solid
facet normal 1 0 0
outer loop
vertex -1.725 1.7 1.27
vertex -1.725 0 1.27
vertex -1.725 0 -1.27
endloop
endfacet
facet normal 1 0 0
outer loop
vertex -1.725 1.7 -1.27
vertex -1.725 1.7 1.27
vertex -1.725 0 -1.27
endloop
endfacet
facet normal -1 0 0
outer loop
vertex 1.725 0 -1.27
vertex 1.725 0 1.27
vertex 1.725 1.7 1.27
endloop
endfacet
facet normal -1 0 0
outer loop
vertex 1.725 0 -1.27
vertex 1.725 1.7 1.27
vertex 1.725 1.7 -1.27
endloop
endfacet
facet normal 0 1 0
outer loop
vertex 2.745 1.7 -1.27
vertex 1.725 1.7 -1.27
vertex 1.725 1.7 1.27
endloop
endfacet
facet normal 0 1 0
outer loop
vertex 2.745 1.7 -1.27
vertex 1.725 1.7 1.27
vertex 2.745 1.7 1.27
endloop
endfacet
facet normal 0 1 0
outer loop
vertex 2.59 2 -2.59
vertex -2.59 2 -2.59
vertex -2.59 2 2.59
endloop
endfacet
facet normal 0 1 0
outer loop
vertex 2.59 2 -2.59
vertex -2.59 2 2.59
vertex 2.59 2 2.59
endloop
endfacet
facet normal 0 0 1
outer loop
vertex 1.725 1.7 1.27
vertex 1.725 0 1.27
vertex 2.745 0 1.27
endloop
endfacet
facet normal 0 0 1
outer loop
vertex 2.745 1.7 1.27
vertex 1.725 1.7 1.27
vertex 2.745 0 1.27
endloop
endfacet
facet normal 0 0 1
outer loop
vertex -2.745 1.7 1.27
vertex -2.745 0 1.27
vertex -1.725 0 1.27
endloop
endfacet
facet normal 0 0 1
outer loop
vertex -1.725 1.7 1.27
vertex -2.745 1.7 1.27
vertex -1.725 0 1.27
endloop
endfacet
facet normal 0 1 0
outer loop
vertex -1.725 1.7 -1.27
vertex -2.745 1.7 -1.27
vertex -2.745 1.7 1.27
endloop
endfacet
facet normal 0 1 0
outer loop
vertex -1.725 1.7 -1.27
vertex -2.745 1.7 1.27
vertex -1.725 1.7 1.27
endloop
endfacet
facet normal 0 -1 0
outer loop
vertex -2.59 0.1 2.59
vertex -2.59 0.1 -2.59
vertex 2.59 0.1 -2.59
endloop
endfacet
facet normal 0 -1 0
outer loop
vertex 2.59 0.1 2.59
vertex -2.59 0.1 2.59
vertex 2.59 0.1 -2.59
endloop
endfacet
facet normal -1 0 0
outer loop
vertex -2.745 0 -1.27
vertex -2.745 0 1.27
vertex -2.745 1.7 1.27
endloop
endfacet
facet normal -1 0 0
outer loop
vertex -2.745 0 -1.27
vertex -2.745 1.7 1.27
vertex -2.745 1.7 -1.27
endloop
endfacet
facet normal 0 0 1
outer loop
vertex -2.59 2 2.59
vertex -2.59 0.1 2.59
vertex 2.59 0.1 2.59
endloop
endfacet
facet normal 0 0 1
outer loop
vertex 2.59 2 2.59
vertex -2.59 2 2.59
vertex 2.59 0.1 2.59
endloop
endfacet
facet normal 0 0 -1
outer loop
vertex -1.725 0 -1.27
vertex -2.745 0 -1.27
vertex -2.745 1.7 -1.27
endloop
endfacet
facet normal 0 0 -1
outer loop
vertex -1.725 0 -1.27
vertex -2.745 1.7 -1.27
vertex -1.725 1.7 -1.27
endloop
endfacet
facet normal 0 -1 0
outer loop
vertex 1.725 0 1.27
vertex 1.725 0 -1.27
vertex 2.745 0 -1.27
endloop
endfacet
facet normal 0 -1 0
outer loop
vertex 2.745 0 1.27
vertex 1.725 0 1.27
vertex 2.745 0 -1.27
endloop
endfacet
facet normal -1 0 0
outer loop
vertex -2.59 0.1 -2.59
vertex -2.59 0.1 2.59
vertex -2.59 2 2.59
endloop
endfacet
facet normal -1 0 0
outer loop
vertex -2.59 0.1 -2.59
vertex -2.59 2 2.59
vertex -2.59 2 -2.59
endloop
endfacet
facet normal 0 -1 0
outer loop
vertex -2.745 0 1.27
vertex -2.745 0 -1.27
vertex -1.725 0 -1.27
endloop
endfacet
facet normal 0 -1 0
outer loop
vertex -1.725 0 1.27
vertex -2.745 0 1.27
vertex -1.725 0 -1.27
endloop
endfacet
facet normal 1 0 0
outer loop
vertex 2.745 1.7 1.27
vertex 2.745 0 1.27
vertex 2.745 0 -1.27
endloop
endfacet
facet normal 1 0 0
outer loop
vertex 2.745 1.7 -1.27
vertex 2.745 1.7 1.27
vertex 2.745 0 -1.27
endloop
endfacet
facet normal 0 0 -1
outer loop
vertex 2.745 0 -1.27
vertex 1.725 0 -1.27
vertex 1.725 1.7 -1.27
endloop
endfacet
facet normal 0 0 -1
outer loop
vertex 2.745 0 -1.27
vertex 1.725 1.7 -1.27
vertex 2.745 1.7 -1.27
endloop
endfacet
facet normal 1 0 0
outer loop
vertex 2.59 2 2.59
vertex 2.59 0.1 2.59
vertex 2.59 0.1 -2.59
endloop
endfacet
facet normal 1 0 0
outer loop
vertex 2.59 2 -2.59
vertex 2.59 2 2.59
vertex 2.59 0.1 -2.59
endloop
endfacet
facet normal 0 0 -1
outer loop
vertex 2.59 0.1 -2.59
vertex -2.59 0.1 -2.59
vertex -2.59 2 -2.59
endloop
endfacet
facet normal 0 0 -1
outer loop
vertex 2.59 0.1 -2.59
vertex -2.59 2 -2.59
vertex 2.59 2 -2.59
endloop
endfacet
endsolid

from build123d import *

# Parameters (mm, degrees)
EXTRUDE_START     = 0.1
SKETCH_1_W        = 5.18
SKETCH_1_H        = 5.18
EXTRUDE_1_DEPTH   = 1.9
SKETCH_2_W        = 1.02
SKETCH_2_H        = 2.54
EXTRUDE_2_DEPTH   = 1.7
EXTRUDE_2_2_DEPTH = 1.7


with BuildPart() as part:
    # Эскиз1 → Бобышка-Вытянуть1 (new body)
    with BuildSketch(Plane(origin=(0, 0, 0), x_dir=(1, 0, 0), z_dir=(0, 1, 0)).offset(EXTRUDE_START)):
        Rectangle(SKETCH_1_W, SKETCH_1_H)
    extrude(amount=EXTRUDE_1_DEPTH)


with BuildPart() as body_2:
    # Эскиз2 → Бобышка-Вытянуть2 (new body)
    with BuildSketch(Plane(origin=(0, 0, 0), x_dir=(1, 0, 0), z_dir=(0, 1, 0))):
        with Locations((-2.235, 0)):
            Rectangle(SKETCH_2_W, SKETCH_2_H)
    extrude(amount=EXTRUDE_2_DEPTH)


with BuildPart() as body_3:
    # Эскиз2 → Extrude 2 2 (new body)
    with BuildSketch(Plane(origin=(0, 0, 0), x_dir=(1, 0, 0), z_dir=(0, 1, 0))):
        with Locations((2.235, 0)):
            Rectangle(SKETCH_2_W, SKETCH_2_H)
    extrude(amount=EXTRUDE_2_2_DEPTH)


solid = Compound([part.part, body_2.part, body_3.part])
